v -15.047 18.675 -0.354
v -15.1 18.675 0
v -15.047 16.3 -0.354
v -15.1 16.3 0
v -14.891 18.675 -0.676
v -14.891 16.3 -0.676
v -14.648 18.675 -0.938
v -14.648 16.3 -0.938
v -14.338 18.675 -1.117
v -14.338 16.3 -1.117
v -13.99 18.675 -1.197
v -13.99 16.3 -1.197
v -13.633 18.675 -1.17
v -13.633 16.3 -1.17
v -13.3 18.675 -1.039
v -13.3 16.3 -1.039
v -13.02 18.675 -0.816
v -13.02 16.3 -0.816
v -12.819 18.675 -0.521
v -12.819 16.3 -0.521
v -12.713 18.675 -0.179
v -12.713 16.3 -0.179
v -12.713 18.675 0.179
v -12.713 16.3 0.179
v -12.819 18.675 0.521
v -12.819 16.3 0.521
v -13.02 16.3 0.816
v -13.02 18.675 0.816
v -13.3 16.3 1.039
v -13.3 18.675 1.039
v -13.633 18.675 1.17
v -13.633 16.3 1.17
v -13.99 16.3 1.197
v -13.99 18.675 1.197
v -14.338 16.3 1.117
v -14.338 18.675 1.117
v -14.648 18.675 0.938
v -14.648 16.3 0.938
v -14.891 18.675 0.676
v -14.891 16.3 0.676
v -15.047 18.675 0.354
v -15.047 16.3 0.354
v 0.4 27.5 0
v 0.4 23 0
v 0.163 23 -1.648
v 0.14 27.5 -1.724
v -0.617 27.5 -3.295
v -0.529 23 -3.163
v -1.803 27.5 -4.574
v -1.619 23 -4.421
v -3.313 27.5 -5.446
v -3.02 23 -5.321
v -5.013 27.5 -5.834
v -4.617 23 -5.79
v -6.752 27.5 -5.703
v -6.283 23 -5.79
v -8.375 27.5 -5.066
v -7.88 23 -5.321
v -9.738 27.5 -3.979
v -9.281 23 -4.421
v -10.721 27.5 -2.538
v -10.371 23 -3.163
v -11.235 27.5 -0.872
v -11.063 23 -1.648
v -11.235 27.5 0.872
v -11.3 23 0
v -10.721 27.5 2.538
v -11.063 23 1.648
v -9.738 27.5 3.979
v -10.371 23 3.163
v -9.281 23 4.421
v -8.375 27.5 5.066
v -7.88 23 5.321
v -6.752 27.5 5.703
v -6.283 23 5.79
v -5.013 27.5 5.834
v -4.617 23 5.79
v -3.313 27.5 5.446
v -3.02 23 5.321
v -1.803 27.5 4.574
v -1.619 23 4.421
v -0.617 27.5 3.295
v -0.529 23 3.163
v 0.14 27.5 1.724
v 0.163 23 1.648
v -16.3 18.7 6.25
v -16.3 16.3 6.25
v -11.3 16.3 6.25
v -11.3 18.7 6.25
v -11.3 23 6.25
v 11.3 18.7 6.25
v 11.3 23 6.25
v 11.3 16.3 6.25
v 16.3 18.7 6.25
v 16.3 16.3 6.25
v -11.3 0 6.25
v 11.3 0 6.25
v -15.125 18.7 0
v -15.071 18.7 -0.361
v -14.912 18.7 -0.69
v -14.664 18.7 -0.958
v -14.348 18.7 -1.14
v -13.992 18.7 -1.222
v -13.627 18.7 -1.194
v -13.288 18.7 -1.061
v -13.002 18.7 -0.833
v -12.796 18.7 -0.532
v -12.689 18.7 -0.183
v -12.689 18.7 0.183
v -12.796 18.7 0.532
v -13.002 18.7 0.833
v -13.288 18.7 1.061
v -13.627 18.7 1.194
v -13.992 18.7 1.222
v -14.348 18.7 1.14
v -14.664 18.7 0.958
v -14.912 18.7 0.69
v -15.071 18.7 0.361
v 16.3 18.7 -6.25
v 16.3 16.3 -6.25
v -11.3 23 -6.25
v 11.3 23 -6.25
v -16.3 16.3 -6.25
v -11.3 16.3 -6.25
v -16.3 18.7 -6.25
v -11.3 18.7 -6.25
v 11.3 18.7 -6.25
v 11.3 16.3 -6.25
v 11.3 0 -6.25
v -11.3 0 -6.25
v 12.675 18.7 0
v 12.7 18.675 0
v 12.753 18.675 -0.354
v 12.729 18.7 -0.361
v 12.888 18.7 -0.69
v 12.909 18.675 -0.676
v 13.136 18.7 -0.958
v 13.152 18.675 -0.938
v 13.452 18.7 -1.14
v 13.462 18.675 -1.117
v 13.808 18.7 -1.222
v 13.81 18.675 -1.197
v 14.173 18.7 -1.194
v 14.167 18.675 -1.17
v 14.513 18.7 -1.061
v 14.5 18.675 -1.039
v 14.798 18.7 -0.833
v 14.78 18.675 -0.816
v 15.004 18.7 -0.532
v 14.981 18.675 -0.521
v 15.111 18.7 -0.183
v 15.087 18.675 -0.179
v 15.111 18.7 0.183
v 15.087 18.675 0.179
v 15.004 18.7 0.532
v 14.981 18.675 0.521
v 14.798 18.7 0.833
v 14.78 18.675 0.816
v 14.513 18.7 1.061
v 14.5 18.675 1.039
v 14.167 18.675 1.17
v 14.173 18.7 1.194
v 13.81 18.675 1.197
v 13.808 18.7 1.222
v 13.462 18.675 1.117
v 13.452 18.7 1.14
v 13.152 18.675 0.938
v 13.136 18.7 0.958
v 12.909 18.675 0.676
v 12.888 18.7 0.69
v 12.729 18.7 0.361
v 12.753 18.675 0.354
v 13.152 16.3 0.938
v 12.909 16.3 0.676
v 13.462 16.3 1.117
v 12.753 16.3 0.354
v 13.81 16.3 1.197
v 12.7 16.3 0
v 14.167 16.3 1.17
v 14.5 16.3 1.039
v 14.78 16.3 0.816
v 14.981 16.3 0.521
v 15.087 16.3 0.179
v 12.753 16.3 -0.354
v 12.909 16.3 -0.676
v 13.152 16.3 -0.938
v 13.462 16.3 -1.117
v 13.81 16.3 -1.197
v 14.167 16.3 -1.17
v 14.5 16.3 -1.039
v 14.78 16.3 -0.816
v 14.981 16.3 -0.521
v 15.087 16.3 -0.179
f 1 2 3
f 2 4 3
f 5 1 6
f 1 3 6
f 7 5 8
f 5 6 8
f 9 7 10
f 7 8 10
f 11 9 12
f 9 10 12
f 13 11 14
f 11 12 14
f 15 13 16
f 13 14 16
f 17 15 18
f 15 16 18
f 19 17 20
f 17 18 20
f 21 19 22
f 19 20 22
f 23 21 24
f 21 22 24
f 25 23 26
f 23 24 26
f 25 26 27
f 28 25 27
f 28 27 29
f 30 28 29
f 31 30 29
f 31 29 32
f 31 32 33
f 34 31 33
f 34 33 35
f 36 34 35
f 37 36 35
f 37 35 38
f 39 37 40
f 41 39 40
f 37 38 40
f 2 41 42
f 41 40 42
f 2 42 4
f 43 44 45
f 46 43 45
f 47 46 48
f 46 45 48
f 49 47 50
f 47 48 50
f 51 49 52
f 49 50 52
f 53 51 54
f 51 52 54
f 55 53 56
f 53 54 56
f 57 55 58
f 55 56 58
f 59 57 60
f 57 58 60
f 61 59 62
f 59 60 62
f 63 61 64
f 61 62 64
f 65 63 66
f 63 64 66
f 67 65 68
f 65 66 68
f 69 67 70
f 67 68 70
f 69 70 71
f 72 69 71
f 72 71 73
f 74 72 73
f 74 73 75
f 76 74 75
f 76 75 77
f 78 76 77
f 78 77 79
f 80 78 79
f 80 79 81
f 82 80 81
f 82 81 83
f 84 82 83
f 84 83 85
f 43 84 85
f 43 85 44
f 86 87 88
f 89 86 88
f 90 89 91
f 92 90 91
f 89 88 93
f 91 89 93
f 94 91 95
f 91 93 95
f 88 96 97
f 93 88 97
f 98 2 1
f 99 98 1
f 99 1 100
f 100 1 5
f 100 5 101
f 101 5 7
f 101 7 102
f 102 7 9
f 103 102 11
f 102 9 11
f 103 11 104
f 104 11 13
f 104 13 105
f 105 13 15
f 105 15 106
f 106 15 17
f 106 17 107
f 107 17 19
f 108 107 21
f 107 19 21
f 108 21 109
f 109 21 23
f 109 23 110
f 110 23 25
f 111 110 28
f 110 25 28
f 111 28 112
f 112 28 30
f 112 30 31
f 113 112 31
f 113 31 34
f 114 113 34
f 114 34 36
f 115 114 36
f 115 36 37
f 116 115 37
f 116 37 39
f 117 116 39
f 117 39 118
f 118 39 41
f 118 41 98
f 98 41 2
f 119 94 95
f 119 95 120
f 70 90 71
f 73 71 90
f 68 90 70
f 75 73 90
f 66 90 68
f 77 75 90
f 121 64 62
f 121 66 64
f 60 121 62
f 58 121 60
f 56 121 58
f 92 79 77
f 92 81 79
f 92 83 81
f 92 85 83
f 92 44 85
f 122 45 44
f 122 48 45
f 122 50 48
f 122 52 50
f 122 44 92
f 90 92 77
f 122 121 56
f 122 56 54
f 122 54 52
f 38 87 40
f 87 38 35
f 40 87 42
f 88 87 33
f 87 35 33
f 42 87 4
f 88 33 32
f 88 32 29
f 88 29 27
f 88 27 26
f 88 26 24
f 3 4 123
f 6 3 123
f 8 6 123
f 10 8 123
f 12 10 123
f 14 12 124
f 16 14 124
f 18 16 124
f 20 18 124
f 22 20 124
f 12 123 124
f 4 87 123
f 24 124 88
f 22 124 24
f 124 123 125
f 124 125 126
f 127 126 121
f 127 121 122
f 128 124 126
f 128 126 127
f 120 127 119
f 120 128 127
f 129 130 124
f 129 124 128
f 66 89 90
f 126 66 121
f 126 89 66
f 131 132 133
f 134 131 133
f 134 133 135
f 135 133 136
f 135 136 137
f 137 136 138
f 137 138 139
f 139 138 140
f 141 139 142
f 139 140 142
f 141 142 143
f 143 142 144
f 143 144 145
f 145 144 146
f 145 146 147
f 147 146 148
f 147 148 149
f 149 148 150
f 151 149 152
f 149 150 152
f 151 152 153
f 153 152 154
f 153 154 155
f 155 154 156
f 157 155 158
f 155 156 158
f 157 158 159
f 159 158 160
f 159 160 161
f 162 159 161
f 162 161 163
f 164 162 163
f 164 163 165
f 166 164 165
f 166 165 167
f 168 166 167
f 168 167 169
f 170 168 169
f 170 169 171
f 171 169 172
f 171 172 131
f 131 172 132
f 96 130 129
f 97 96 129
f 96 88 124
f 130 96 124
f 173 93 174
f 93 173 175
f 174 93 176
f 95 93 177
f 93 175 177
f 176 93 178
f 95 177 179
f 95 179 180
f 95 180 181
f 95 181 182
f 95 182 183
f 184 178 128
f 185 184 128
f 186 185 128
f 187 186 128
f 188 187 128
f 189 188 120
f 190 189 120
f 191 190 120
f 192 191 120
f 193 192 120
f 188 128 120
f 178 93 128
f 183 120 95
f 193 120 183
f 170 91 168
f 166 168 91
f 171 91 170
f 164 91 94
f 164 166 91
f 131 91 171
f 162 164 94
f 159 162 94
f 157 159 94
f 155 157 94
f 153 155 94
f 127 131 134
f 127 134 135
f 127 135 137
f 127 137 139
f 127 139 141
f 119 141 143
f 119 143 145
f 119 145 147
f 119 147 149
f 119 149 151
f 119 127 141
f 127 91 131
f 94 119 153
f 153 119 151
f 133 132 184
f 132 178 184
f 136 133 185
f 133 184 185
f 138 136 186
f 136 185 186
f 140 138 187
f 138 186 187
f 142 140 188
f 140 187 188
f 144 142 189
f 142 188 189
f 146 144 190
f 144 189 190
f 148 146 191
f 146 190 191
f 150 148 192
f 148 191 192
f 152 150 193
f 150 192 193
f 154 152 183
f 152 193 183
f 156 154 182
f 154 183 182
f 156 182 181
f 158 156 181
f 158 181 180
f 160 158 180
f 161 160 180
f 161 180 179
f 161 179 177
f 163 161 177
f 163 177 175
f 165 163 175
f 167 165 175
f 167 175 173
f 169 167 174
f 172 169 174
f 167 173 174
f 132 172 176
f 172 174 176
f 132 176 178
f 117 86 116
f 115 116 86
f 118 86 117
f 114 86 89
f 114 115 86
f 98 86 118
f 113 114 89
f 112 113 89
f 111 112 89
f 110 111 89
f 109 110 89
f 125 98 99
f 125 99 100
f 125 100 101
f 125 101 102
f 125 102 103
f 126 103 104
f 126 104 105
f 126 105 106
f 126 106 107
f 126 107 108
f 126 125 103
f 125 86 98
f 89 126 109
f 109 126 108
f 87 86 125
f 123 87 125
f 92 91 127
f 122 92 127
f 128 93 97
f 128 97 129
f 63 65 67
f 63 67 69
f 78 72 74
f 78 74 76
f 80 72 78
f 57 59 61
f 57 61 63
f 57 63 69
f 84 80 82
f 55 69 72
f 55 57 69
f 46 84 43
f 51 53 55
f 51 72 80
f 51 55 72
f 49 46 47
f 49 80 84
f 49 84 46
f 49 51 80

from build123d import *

# Parameters (mm, degrees)
SKETCH1_W                      = 22.6
SKETCH1_H                      = 12.5
BOSS_EXTRUDE1_DEPTH            = 23
SKETCH2_W                      = 5
SKETCH2_H                      = 12.5
BOSS_EXTRUDE2_DEPTH            = 2.4
M2_CLEARANCE_HOLE1_D           = 2.4
M2_CLEARANCE_HOLE1_DEPTH       = 21.51
M2_CLEARANCE_HOLE1_CSINK_D     = 2.45
M2_CLEARANCE_HOLE1_CSINK_ANGLE = 90
M2_CLEARANCE_HOLE1_TIP         = 0.721032743
SKETCH5_R                      = 5.85
BOSS_EXTRUDE3_DEPTH            = 4.5


with BuildPart() as part:
    # Sketch1 → Boss-Extrude1 (new body)
    with BuildSketch(Plane(origin=(0, 0, 0), x_dir=(1, 0, 0), z_dir=(0, 1, 0))):
        Rectangle(SKETCH1_W, SKETCH1_H)
    extrude(amount=BOSS_EXTRUDE1_DEPTH)

    # Sketch2 → Boss-Extrude2 (add)
    with BuildSketch(Plane(origin=(0, 18.7, 0), x_dir=(1, 0, 0), z_dir=(0, 1, 0))):
        with Locations((13.8, 0)):
            Rectangle(SKETCH2_W, SKETCH2_H)
        with Locations((-13.8, 0)):
            Rectangle(SKETCH2_W, SKETCH2_H)
    extrude(amount=-BOSS_EXTRUDE2_DEPTH)

    # M2 Clearance Hole1
    with Locations(Plane(origin=(0, 18.7, 0), x_dir=(1, 0, 0), z_dir=(0, 1, 0))):
        with Locations((-13.9, 0), (13.9, 0)):
            CounterSinkHole(M2_CLEARANCE_HOLE1_D / 2, M2_CLEARANCE_HOLE1_CSINK_D / 2, depth=M2_CLEARANCE_HOLE1_DEPTH, counter_sink_angle=M2_CLEARANCE_HOLE1_CSINK_ANGLE)
            with Locations((0, 0, -(M2_CLEARANCE_HOLE1_DEPTH + M2_CLEARANCE_HOLE1_TIP / 2))):  # 118° drill point
                Cone(0, M2_CLEARANCE_HOLE1_D / 2, M2_CLEARANCE_HOLE1_TIP, mode=Mode.SUBTRACT)

    # Sketch5 → Boss-Extrude3 (add)
    with BuildSketch(Plane(origin=(0, 23, 0), x_dir=(1, 0, 0), z_dir=(0, 1, 0))):
        with Locations((-5.45, 0)):
            Circle(SKETCH5_R)
    extrude(amount=BOSS_EXTRUDE3_DEPTH)


solid = part.part
